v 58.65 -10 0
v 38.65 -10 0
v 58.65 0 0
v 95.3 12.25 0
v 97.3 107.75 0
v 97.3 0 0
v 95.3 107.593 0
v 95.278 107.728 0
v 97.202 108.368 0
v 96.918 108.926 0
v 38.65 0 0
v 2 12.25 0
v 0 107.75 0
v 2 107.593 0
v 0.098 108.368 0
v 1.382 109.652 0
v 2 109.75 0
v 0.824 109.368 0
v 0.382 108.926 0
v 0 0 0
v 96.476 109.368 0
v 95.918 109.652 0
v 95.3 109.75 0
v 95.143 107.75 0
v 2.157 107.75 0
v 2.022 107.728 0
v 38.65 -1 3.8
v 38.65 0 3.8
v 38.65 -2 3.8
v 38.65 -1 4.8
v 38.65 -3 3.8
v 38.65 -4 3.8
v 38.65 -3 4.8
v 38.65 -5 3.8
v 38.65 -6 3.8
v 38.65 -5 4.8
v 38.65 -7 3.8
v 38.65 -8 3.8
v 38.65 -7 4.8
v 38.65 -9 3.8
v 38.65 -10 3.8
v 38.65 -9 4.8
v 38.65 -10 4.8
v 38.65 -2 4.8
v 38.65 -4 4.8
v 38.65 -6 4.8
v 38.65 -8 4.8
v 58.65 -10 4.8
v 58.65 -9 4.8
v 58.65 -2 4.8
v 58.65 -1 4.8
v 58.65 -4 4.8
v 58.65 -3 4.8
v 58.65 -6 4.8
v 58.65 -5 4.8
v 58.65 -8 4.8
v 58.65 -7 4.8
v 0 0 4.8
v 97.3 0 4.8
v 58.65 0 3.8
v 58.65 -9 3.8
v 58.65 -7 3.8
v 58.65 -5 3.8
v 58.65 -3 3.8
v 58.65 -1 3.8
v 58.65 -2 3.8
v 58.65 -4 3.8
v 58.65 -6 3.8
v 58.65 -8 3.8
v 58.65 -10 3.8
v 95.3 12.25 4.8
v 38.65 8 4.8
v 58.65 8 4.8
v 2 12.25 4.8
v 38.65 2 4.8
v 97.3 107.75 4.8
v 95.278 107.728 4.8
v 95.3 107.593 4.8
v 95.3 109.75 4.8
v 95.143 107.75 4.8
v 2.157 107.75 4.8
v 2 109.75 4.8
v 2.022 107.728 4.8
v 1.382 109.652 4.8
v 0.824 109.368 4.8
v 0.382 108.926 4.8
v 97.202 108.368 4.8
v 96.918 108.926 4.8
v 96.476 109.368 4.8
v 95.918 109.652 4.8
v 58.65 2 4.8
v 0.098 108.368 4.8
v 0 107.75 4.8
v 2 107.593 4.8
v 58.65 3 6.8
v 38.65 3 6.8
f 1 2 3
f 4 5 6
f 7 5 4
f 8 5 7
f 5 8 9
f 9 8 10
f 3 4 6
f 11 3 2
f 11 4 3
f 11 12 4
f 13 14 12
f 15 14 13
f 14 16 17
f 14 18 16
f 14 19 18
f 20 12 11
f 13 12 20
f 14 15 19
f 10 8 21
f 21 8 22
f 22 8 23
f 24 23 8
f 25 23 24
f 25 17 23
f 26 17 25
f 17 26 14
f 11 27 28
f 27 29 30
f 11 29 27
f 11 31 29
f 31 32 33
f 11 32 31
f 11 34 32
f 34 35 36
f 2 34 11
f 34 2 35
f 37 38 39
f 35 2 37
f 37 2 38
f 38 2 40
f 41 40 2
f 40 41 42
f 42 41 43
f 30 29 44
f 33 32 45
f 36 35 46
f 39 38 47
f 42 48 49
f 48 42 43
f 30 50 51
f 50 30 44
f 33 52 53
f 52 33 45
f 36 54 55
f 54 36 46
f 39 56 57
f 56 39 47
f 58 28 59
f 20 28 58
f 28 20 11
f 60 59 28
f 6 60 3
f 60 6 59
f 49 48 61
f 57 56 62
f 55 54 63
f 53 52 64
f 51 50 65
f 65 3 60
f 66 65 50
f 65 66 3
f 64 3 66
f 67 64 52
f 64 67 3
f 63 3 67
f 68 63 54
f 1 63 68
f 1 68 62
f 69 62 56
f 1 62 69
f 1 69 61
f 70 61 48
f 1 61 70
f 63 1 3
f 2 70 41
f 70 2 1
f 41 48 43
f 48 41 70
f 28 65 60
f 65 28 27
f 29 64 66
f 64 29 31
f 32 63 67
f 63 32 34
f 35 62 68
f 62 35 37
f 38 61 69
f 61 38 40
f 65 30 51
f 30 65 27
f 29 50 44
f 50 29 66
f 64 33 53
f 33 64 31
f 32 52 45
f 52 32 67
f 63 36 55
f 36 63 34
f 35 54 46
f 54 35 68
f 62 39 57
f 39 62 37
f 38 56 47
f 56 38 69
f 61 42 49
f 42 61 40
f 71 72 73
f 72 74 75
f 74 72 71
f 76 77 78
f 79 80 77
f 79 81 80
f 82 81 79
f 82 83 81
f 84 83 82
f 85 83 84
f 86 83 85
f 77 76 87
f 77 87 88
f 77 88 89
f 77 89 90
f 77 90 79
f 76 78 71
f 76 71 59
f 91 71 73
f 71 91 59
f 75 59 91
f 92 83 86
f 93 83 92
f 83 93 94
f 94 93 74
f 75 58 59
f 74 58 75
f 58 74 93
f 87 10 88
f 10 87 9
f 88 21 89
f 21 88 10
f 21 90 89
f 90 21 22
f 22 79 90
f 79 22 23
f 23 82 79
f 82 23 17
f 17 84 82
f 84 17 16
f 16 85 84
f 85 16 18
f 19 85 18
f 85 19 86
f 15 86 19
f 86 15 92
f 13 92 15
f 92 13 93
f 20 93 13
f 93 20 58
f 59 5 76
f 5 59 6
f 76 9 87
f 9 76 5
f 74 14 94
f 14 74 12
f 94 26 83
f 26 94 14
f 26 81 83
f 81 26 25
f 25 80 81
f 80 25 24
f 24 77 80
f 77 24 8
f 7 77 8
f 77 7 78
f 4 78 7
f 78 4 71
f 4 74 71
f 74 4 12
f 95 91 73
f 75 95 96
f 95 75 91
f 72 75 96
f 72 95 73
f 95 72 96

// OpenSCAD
// file: lib/utils.scad
include <params.scad>;

function tol(val) = val - tolerance;

module cone(r, angle, invert=false) {
    h = tan((180 - angle) / 2) * r;
    translate([0, 0, -h]) {
        if (invert) {
                cylinder(r1=r,r2=0,h=h, $fn=20); 
        } else {
            cylinder(r1=0,r2=r,h=h, $fn=20); 
        }
    }
}

module roundrect(vect, r, $fn=20) {
    sq = len(vect) > 1
        ? [for (i = [0:1:len(vect)-1]) vect[i] - r * 2]
        : vect - r * 2;
    minkowski() {
        square(sq);
        translate([r, r])
            circle(r=r);
    }
}

module profile($fn=20) {
    minkowski() {
        translate([fan_case_radius, fan_case_radius, 0])
            square(fan_case - fan_case_radius * 2);
        circle(fan_case_radius, $fn);
    }
}

module fan_mount_points(radius, $fn=20) {
    offset = (fan_case - fan_screw_distance) / 2;
    translate([offset, offset, 0]) {
        circle(radius, $fn);
        translate([fan_screw_distance, 0, 0])
            circle(radius, $fn);
        translate([fan_screw_distance, fan_screw_distance, 0])
            circle(radius, $fn);
        translate([0, fan_screw_distance, 0])
            circle(radius, $fn);
    }
}

module square_grill(width, height, fin_width, fin_count) {
    fin_spacing = width / fin_count;
    difference() {
        square(width);
        union() {
            for (i = [0:1:fin_count]) {
                translate([(i + 1) * fin_spacing - (fin_spacing / 2) - (fin_width / 2), 0, 0])
                    square([fin_width, height]);
            }
        }
    }
}

function inch_to_mm(inches) = inches * 25.4;
// file: lib/params.scad
fan_case = 120;
fan_screw_distance = 105;
fan_case_depth = 25;
fan_case_radius = 5;
fan_case_screw_radius = 2.5;
fan_case_socket_cap_radius = 5.6 / 2;
fan_case_screw_head_radius = 3;
fan_case_screw_head_angle = 90;

grill_screw_size = 3;
grill_screw_radius = grill_screw_size / 2;
grill_screw_inset = 2;
grill_radius = 114 / 2;
grill_fin_offset = 10;
grill_fin_thickness = 2;
grill_fin_degrees = 30;

rear_grill_thickness = 2;

front_grill_thickness = 2;
front_grill_fin_count = 6;
front_grill_fin_thickness = 2;

filter_thickness = 5;
filter_width = fan_screw_distance - fan_case_screw_radius * 3;
filter_offset = (fan_case - filter_width) / 2;

base_retainer_thickness = 2;
base_height = 30;
base_cut_offset = 10;
base_retainer_inset = 4;

adapter_thickness = 2;
adapter_duct_in = 4;
adapter_height = 28;
adapter_duct_height = 70;

caddy_thickness = 2;
caddy_handle_width = 20;
caddy_handle_depth = 10;
caddy_handle_grip_count = 5;
caddy_handle_grip_depth = 1;
caddy_handle_grip_width = 1;
caddy_clip_height = 2;
caddy_clip_depth = 6;
caddy_clip_offset = 1;

tolerance = 0.2;
// main file
include <lib/params.scad>;
use <lib/utils.scad>;

caddy_width = filter_width - tolerance;
caddy_height = filter_thickness - tolerance;
caddy_depth = filter_width + filter_offset + front_grill_fin_thickness / 2;
caddy_vec = [caddy_width, caddy_depth];
caddy_front_set = caddy_depth - filter_width;
caddy_handle_offset = caddy_width / 2 - caddy_handle_width / 2;

module caddy_profile() {
    union() {
        square([caddy_width, caddy_depth / 2]);
        roundrect(caddy_vec, 2);
    }
}

union() {
    linear_extrude(height=caddy_height)
        union() {
            // base
            difference() {
                caddy_profile();
                offset(r=-caddy_thickness)
                    caddy_profile();
            }
            // front set
            square([caddy_width, caddy_front_set]);
        }
    // handle
    difference() {
        // handle body
        linear_extrude(height=caddy_height)
            translate([caddy_handle_offset, -caddy_handle_depth, 0])
                square([caddy_handle_width, caddy_handle_depth]);
        // grip cutouts
        translate([caddy_handle_offset, -caddy_handle_grip_width, caddy_height-caddy_handle_grip_depth])
            linear_extrude(height=caddy_handle_grip_depth) {
                for (i = [0:1:caddy_handle_grip_count]) {
                    translate([0, i*(-caddy_handle_grip_width-caddy_handle_grip_depth), 0])
                        square([caddy_handle_width, caddy_handle_grip_width]);
                }
            }
    }
    // clip
    translate([caddy_handle_offset + caddy_handle_width, adapter_thickness, caddy_height])
        rotate([0, -90, 0])
            linear_extrude(height=caddy_handle_width)
                polygon([[0, 0], [0, caddy_clip_depth], [caddy_clip_height, caddy_clip_offset]]);
}
